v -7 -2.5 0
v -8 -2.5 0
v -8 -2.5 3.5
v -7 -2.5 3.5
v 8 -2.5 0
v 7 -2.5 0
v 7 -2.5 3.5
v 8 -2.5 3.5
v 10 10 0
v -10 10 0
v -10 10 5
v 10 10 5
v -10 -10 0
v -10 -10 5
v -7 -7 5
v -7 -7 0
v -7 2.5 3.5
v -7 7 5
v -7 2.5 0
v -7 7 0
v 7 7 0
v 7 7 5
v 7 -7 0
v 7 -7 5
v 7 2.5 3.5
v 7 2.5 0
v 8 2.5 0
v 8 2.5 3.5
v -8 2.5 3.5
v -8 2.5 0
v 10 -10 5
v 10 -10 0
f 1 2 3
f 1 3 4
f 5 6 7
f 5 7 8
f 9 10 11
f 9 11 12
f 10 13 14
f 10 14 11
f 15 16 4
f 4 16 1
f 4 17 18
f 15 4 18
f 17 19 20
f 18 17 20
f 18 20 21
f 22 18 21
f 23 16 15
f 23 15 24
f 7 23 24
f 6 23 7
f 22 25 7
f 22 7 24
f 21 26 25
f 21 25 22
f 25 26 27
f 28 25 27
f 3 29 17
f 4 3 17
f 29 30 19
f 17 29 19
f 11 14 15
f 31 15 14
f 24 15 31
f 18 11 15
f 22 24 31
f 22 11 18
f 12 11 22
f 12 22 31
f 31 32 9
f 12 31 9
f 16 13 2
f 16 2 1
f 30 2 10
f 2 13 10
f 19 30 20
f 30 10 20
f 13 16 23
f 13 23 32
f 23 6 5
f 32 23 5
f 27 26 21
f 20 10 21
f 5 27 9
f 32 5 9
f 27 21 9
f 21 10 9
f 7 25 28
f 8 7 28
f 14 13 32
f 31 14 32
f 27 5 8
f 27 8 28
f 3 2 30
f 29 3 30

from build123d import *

# Parameters (mm, degrees)
SKETCH_W     = 20
SKETCH_H     = 20
SKETCH_W_2   = 14
SKETCH_H_2   = 14
PAD_DEPTH    = 5
SKETCH001_W  = 16
SKETCH001_H  = 5
POCKET_DEPTH = 3.5


with BuildPart() as part:
    # Sketch → Pad (new body)
    with BuildSketch(Plane.XY):
        Rectangle(SKETCH_W, SKETCH_H)
        Rectangle(SKETCH_W_2, SKETCH_H_2, mode=Mode.SUBTRACT)
    extrude(amount=PAD_DEPTH)

    # Sketch001 → Pocket (cut)
    with BuildSketch(Plane.XY):
        Rectangle(SKETCH001_W, SKETCH001_H)
    extrude(amount=POCKET_DEPTH, mode=Mode.SUBTRACT)


solid = part.part
